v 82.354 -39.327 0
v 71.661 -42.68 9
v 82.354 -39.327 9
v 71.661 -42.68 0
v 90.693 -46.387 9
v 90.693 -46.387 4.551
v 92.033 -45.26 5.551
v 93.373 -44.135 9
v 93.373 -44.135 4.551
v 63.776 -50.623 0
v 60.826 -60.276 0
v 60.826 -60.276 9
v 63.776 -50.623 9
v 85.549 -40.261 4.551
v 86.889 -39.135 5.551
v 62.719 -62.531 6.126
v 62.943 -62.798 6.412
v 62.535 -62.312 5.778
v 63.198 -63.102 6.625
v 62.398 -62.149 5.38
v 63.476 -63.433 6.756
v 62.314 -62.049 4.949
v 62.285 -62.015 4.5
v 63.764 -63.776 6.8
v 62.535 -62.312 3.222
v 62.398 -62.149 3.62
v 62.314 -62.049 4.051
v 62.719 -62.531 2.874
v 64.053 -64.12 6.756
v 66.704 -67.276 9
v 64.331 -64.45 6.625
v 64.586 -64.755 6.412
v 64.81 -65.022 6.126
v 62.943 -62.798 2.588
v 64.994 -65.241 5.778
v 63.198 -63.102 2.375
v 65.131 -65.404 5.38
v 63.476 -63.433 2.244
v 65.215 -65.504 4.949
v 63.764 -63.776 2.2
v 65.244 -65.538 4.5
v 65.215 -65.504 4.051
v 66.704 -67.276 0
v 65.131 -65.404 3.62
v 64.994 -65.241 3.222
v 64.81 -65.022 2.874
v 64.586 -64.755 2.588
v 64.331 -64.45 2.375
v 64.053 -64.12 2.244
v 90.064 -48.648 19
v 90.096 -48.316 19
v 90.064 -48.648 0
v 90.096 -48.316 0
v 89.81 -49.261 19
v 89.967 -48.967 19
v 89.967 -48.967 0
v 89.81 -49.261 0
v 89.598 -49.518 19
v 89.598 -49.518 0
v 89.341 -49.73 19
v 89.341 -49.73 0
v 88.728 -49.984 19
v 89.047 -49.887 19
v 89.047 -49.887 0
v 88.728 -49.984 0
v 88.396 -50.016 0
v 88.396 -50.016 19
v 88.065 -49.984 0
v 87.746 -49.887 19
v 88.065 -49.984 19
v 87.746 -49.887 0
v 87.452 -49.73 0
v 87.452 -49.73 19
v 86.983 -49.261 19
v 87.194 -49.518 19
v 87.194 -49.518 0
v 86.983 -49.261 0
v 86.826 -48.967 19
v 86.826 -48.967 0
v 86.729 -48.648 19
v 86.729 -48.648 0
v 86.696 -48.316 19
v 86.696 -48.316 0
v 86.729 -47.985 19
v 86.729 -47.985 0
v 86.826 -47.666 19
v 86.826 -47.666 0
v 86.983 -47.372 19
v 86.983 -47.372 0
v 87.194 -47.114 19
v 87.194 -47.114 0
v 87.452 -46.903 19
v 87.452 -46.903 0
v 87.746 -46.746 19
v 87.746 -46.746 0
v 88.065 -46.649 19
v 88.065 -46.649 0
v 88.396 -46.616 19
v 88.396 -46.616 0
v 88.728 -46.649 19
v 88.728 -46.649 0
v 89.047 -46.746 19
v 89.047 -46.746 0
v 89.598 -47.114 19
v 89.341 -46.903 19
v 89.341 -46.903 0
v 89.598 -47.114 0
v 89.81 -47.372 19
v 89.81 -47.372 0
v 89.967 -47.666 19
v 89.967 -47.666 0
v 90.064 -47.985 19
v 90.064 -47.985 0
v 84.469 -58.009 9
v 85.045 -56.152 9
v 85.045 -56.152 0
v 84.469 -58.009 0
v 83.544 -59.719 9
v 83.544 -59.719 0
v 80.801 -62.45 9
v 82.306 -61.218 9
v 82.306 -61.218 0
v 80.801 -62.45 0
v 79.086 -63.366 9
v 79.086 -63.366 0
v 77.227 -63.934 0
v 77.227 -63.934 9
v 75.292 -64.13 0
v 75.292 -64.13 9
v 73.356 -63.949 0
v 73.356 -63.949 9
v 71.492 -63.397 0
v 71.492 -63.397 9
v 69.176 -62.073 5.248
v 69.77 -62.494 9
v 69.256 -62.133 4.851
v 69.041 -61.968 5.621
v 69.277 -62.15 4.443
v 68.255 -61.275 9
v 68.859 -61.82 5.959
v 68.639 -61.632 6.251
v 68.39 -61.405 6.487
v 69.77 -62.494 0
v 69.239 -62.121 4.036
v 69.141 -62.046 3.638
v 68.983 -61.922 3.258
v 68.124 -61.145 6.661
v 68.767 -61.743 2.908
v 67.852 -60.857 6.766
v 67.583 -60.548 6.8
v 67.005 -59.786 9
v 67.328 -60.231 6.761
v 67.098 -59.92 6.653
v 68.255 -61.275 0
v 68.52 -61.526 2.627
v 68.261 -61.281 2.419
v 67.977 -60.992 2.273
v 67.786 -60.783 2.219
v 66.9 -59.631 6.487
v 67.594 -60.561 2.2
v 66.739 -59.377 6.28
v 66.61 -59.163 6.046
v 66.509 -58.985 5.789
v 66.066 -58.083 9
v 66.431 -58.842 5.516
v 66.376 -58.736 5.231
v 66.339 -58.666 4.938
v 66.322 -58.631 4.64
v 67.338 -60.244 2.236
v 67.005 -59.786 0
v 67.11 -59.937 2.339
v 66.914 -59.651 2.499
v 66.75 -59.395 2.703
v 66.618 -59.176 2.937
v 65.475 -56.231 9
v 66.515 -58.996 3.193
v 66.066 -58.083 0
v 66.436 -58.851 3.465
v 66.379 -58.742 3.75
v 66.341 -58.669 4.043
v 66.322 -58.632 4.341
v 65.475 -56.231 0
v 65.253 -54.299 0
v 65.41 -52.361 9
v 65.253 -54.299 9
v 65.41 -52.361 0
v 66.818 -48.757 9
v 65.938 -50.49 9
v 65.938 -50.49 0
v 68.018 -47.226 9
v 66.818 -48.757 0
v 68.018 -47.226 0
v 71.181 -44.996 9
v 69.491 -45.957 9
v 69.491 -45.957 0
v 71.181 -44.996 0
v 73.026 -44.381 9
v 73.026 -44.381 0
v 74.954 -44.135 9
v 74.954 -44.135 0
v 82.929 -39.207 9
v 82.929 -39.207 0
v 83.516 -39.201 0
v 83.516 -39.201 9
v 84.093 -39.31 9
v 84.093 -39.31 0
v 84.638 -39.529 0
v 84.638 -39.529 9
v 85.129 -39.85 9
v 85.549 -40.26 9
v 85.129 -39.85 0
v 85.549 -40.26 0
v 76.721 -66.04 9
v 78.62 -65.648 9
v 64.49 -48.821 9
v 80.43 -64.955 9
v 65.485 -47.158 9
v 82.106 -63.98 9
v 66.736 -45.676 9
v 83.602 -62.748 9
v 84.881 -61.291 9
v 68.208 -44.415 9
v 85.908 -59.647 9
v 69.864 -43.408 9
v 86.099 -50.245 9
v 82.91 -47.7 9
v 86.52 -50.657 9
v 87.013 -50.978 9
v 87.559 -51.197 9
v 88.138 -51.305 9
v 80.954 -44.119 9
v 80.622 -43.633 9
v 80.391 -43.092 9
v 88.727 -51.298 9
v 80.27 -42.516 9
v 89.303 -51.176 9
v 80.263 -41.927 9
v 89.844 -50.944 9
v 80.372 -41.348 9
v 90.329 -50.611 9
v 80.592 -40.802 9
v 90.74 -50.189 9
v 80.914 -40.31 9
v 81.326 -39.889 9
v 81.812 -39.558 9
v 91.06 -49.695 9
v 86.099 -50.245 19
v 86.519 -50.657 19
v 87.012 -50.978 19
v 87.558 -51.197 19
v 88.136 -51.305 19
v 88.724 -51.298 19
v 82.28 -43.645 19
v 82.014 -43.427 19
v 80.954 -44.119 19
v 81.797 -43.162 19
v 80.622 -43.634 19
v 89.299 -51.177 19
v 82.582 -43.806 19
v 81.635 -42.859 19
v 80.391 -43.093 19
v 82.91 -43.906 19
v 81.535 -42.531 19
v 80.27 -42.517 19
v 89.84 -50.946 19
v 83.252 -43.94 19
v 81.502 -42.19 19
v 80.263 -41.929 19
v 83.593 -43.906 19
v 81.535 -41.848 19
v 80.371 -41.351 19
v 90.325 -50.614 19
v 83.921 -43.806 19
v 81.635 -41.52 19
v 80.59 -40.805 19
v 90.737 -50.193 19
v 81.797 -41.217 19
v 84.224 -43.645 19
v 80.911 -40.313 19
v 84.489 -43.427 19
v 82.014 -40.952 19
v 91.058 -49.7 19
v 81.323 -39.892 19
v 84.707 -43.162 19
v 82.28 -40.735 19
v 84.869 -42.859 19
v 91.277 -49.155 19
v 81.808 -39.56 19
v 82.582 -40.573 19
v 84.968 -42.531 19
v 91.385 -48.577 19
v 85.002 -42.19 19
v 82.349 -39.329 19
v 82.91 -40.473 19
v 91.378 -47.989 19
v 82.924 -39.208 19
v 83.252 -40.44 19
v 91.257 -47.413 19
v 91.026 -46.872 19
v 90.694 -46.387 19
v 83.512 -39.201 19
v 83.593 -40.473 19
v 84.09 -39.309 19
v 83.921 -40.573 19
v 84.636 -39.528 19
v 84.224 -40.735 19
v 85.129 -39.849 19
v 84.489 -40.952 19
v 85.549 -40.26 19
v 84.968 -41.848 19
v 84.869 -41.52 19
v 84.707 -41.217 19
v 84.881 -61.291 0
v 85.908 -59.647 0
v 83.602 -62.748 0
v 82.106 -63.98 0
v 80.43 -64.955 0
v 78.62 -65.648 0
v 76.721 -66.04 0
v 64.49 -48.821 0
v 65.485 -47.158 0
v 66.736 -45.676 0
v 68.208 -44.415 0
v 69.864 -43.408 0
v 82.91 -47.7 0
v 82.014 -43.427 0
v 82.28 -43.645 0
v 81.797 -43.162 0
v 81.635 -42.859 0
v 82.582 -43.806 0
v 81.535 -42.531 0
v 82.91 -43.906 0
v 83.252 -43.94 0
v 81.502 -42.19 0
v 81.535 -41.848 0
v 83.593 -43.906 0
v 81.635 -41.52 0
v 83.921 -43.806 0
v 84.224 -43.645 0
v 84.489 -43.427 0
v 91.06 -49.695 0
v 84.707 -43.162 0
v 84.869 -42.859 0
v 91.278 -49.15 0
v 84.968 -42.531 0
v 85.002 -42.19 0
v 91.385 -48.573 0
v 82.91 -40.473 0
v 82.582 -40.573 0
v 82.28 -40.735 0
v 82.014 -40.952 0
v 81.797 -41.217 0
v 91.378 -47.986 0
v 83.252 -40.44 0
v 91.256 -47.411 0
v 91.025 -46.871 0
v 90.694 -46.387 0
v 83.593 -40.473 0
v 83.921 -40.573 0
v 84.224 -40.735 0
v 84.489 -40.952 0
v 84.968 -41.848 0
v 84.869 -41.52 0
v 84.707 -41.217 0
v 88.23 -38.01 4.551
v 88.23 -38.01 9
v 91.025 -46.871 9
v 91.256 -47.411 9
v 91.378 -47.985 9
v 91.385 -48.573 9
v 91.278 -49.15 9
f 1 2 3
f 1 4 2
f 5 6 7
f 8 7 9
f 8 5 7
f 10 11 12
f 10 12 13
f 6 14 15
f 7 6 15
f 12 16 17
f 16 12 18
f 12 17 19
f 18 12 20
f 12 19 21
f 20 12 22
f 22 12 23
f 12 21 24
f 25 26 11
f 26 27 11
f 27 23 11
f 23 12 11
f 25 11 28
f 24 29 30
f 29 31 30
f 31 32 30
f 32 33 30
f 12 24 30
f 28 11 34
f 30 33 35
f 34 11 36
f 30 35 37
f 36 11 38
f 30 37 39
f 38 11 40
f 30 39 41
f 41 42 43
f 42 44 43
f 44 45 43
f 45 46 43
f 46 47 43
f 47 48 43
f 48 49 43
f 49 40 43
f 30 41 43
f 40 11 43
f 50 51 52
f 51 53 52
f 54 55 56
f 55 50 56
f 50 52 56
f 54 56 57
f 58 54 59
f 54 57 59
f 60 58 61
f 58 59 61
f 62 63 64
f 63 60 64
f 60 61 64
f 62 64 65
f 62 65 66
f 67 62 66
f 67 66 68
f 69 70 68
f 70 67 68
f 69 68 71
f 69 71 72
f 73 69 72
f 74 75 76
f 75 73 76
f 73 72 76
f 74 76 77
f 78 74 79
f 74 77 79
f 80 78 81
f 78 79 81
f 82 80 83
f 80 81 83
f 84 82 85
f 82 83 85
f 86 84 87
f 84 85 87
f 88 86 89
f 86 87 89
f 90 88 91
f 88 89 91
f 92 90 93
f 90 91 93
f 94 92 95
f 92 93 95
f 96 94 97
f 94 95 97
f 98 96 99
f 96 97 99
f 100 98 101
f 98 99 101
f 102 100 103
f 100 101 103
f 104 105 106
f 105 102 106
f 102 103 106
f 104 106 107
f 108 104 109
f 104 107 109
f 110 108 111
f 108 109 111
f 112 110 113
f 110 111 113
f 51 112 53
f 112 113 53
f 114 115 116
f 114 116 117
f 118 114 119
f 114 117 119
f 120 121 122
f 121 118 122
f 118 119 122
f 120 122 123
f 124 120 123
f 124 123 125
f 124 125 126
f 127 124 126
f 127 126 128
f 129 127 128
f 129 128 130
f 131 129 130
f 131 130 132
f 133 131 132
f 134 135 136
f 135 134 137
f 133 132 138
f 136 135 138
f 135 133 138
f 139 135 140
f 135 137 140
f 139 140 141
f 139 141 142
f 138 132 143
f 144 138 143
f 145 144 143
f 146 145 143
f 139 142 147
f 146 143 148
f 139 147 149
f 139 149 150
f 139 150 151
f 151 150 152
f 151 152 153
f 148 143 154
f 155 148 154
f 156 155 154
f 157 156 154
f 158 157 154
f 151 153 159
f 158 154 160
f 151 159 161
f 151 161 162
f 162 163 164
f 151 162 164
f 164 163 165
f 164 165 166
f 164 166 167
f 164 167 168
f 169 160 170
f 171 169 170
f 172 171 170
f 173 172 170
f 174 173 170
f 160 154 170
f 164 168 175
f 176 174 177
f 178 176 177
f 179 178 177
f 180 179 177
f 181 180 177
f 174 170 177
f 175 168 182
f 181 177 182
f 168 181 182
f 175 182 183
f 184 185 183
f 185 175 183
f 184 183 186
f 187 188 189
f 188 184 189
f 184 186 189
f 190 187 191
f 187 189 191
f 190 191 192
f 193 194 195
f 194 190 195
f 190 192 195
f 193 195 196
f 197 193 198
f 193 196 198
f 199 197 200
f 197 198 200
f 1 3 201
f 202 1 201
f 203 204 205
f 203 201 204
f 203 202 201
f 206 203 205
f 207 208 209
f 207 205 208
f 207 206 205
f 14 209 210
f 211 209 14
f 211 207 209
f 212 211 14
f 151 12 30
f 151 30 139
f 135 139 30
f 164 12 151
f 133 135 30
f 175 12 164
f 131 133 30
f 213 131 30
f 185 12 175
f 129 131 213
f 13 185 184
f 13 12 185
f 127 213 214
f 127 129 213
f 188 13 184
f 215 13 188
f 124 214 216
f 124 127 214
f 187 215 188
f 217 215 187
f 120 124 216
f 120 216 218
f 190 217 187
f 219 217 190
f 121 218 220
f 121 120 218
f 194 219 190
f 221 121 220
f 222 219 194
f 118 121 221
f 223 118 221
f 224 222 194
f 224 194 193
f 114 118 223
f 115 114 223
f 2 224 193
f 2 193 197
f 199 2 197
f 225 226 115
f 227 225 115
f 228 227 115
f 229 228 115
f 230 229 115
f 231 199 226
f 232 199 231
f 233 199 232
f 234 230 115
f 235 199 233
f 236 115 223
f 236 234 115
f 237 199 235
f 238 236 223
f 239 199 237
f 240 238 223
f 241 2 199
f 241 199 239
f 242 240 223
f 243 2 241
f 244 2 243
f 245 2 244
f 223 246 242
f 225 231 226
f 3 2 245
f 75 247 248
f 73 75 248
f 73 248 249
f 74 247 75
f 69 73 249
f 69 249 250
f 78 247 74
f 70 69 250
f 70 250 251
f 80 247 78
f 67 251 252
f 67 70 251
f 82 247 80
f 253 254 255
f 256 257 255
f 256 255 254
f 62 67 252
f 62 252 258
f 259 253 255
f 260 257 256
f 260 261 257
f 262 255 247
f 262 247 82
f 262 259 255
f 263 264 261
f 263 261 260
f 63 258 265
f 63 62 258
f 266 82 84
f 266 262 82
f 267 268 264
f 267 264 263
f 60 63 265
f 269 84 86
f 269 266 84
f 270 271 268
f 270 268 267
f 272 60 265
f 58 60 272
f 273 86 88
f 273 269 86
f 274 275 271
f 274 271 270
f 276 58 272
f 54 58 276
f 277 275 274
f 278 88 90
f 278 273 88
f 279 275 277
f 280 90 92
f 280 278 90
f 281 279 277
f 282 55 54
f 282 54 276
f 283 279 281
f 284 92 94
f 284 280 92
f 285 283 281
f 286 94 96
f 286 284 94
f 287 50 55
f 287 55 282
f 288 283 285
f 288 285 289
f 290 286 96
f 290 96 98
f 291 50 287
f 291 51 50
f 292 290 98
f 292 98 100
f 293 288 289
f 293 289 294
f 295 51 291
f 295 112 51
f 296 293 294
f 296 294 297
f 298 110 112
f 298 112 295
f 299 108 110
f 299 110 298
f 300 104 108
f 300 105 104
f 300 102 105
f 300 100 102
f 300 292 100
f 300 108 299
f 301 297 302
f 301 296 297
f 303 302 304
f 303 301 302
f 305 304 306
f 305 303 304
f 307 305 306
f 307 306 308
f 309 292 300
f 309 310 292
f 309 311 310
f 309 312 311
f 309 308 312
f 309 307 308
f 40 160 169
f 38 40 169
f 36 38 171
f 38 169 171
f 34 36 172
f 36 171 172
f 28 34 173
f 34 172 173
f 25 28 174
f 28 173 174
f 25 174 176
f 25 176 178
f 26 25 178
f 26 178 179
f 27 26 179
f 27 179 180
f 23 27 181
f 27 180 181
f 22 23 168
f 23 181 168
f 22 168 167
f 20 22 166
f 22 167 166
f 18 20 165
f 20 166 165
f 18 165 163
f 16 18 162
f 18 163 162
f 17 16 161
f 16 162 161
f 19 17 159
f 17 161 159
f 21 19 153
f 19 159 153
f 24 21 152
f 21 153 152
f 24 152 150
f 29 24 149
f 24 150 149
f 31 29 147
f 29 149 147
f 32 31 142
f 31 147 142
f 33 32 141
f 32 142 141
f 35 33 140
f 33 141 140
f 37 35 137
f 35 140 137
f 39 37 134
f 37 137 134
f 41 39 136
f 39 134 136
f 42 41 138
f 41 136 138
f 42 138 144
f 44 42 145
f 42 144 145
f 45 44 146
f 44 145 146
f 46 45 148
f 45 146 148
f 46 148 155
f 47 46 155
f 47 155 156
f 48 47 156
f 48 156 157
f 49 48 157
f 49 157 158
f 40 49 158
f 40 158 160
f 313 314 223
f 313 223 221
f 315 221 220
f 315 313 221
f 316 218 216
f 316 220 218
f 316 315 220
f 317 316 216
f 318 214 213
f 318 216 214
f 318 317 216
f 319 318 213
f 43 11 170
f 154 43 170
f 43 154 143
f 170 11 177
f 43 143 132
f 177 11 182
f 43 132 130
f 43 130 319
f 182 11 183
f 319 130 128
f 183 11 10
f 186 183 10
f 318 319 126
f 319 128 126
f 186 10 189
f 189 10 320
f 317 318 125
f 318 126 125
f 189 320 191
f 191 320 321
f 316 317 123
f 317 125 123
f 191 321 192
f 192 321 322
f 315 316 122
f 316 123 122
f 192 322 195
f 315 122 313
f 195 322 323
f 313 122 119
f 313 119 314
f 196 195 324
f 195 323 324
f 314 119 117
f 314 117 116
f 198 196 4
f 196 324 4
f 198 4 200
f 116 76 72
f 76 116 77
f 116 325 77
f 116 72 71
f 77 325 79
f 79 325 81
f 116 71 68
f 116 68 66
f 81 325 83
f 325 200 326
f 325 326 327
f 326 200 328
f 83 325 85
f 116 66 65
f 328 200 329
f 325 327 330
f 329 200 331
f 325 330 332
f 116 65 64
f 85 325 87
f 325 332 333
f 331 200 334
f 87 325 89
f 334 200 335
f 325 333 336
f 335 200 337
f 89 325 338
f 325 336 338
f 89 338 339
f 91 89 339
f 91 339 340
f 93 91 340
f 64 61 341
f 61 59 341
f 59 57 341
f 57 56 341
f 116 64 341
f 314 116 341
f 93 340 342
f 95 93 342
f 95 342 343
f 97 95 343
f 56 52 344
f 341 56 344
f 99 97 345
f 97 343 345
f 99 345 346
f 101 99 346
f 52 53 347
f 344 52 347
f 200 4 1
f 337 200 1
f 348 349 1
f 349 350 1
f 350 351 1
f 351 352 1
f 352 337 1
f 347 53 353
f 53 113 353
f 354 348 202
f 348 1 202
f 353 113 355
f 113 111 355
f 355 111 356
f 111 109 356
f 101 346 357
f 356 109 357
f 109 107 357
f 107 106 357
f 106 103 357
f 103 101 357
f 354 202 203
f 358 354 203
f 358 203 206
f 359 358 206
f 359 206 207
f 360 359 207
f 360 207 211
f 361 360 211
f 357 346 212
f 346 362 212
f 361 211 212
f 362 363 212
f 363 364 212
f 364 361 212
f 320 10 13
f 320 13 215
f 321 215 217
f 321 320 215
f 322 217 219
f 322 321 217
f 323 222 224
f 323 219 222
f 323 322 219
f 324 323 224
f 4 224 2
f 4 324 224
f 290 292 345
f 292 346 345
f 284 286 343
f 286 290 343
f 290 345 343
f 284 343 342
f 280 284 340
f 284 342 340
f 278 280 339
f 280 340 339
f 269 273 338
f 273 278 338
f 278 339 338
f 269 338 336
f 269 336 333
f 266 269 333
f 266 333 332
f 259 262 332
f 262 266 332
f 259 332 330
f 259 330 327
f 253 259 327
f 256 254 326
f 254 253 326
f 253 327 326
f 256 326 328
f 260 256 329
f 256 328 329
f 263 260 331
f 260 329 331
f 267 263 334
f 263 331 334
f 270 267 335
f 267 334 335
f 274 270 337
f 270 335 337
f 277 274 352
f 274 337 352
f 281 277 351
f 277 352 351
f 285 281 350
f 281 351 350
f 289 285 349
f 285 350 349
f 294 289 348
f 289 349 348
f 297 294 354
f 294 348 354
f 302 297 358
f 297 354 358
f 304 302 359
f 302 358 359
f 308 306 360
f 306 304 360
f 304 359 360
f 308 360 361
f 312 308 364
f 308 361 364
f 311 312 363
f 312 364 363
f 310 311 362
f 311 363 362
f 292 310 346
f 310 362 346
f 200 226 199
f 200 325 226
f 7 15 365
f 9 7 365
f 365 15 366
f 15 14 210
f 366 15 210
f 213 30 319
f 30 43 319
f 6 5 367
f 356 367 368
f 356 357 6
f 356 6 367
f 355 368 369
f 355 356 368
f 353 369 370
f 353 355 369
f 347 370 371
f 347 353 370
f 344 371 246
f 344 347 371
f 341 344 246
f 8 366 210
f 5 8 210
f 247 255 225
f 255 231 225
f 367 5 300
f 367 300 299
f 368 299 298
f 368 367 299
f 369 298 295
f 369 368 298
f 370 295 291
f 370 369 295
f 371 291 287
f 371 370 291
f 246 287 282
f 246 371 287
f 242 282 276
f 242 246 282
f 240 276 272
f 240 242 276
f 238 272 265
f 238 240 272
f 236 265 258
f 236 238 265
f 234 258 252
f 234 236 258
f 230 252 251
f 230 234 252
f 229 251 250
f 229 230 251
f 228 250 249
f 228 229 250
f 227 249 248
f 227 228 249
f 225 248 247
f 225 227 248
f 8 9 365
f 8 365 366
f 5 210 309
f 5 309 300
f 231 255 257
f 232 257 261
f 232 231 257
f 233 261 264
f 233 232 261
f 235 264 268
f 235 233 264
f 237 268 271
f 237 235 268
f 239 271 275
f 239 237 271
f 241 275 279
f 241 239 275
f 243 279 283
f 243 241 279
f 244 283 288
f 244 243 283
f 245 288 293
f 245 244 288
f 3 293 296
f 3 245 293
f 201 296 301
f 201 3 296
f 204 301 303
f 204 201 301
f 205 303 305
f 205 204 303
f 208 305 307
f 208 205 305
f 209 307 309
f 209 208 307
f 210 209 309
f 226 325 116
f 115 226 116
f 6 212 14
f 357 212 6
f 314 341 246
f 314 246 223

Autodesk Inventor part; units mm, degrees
ref_plane "YZ Plane" through (0, 0, 0) normal (1, 0, 0) x (0, 1, 0)
ref_plane "XZ Plane" through (0, 0, 0) normal (0, 1, 0) x (-1, 0, 0)
ref_plane "XY Plane" through (0, 0, 0) normal (0, 0, 1) x (1, 0, 0)
sketch "Sketch1" plane through (0, 0, 0) normal (0, 0, 1) x (1, 0, 0)
  circle A0 centre (83.2518, -42.1897) radius 1.5 projected
  circle A1 centre (88.3962, -48.3162) radius 1.5 projected
  circle A2 centre (75.2518, -54.1305) radius 10 projected
  arc A3 (71.6612, -42.6802) -> (85.9084, -59.6473) centre (75.2518, -54.1305) ccw
  arc A4 (85.5492, -40.2605) -> (82.3541, -39.3271) centre (83.2518, -42.1897) ccw
  arc A5 (91.0604, -49.6954) -> (90.6937, -46.387) centre (88.3962, -48.3162) ccw
  line L0 (71.6612, -42.6802) -> (82.3541, -39.3271)
  line L1 (91.0604, -49.6954) -> (85.9084, -59.6473)
  line L2 (85.5492, -40.2605) -> (90.6937, -46.387)
  circle A6 centre (83.2518, -42.1897) radius 1.75
  circle A7 centre (88.3962, -48.3162) radius 1.7
  line L3 (88.1215, -43.3238) -> (66.062, -61.8472) construction
  line L4 (82.9099, -47.6999) -> (85.0453, -56.1521)
  line L5 (82.9099, -47.6999) -> (74.9544, -44.1349)
  circle A8 centre (75.2518, -54.1305) radius 9 construction
  line L6 (60.8256, -60.2763) -> (66.7035, -67.2763)
  line L7 (60.8256, -60.2763) -> (63.7758, -50.6232)
  line L8 (66.7035, -67.2763) -> (76.7214, -66.0401)
  point P0 (0, 0)
  dimension "d0" = 24
  dimension "d1" = 6
  dimension "d2" = 6
  dimension "d3" = 3.5
  dimension "d4" = 3.4
  dimension "d5" = 18
  dimension "d8" = 15
  dimension "d9" = 7
extrude "Extrusion1" add sketch "Sketch1" along normal blind 9 contours A2 L4 | L5 A2 | L0 A4 L2 A5 L1 A3 | A3 L8 L6 L7
sketch "Sketch2" plane through (66.7035, -67.2763, 0) normal (-0.7658175, -0.643058, 0) x (0, 0, 1)
  line L0 (9, 9.1406) -> (9, 0) projected
  line L1 (9, 4.5703) -> (0, 4.5703) construction
  line L2 (0, 9.1406) -> (0, 0) projected
  line L3 (0, 9.1406) -> (9, 9.1406) projected
  line L4 (4.5, 9.1406) -> (4.5, 0) construction
  line L5 (0, 0) -> (9, 0) projected
  point P0 (0, 94.4156)
  point P1 (4.5, 4.5703)
hole "Hole1" at (63.7645, -63.7763, 4.5) direction (0.7658175, 0.643058, 0) diameter 4.6 depth 8
ref_plane "Work Plane1" through (122.4886, -30.1352, -3.9205) normal (0.643058, -0.7658175, 0) x (0, 0, 1)
sketch "Sketch3" plane through (122.4886, -30.1352, -3.9205) normal (0.643058, -0.7658175, 0) x (0, 0, 1)
  line L0 (3.9205, 34.8) -> (12.9205, 34.8) projected
  line L1 (8.4716, 29.3) -> (8.4716, 32.8) projected
  line L2 (8.4716, 32.8) -> (8.4716, 33.3)
  line L3 (3.9205, 34.8) -> (12.9205, 34.8) projected
  line L4 (8.4716, 34.8) -> (9.4716, 33.05)
  line L5 (9.4716, 33.05) -> (8.4716, 31.3)
  line L6 (8.4716, 31.3) -> (12.9205, 31.3)
  line L7 (12.9205, 31.3) -> (12.9205, 34.8)
  line L8 (8.4716, 33.05) -> (10.4716, 33.05) construction
  point P0 (3.9205, 74.4253)
  dimension "d17" = 0.5
  dimension "d18" = 1
extrude "Extrusion2" add sketch "Sketch3" against normal blind 16
sketch "Sketch4" plane through (122.4886, -30.1352, -3.9205) normal (0.643058, -0.7658175, 0) x (0.7658175, 0.643058, 0)
  line L0 (-34.8, 12.9205) -> (-34.8, 8.4716) projected
  line L1 (-34.8, 8.4716) -> (-33.05, 9.4716) projected
  line L2 (-33.05, 9.4716) -> (-31.3, 8.4716) projected
  line L3 (-31.3, 8.4716) -> (-31.3, 12.9205) projected
  line L4 (-31.3, 12.9205) -> (-34.8, 12.9205) projected
  point P0 (-74.4253, 3.9205)
extrude "Extrusion3" cut sketch "Sketch4" against normal blind 8
sketch "Sketch5" plane through (0, 0, 9) normal (0, 0, 1) x (1, 0, 0)
  circle A0 centre (83.2518, -42.1897) radius 1.75 projected
  circle A1 centre (83.2518, -42.1897) radius 1.75 projected
  circle A2 centre (88.3962, -48.3162) radius 1.7 projected
  circle A3 centre (88.3962, -48.3162) radius 1.7 projected
  circle A4 centre (88.3962, -48.3162) radius 3
  circle A5 centre (83.2518, -42.1897) radius 3
  line L0 (85.5492, -40.2605) -> (90.6937, -46.387)
  line L1 (80.9543, -44.1188) -> (86.0988, -50.2454)
  point P0 (0, 0)
  dimension "d23" = 6
  dimension "d24" = 6
extrude "Extrusion4" add sketch "Sketch5" along normal blind 10
properties part number "marker_cerret"
